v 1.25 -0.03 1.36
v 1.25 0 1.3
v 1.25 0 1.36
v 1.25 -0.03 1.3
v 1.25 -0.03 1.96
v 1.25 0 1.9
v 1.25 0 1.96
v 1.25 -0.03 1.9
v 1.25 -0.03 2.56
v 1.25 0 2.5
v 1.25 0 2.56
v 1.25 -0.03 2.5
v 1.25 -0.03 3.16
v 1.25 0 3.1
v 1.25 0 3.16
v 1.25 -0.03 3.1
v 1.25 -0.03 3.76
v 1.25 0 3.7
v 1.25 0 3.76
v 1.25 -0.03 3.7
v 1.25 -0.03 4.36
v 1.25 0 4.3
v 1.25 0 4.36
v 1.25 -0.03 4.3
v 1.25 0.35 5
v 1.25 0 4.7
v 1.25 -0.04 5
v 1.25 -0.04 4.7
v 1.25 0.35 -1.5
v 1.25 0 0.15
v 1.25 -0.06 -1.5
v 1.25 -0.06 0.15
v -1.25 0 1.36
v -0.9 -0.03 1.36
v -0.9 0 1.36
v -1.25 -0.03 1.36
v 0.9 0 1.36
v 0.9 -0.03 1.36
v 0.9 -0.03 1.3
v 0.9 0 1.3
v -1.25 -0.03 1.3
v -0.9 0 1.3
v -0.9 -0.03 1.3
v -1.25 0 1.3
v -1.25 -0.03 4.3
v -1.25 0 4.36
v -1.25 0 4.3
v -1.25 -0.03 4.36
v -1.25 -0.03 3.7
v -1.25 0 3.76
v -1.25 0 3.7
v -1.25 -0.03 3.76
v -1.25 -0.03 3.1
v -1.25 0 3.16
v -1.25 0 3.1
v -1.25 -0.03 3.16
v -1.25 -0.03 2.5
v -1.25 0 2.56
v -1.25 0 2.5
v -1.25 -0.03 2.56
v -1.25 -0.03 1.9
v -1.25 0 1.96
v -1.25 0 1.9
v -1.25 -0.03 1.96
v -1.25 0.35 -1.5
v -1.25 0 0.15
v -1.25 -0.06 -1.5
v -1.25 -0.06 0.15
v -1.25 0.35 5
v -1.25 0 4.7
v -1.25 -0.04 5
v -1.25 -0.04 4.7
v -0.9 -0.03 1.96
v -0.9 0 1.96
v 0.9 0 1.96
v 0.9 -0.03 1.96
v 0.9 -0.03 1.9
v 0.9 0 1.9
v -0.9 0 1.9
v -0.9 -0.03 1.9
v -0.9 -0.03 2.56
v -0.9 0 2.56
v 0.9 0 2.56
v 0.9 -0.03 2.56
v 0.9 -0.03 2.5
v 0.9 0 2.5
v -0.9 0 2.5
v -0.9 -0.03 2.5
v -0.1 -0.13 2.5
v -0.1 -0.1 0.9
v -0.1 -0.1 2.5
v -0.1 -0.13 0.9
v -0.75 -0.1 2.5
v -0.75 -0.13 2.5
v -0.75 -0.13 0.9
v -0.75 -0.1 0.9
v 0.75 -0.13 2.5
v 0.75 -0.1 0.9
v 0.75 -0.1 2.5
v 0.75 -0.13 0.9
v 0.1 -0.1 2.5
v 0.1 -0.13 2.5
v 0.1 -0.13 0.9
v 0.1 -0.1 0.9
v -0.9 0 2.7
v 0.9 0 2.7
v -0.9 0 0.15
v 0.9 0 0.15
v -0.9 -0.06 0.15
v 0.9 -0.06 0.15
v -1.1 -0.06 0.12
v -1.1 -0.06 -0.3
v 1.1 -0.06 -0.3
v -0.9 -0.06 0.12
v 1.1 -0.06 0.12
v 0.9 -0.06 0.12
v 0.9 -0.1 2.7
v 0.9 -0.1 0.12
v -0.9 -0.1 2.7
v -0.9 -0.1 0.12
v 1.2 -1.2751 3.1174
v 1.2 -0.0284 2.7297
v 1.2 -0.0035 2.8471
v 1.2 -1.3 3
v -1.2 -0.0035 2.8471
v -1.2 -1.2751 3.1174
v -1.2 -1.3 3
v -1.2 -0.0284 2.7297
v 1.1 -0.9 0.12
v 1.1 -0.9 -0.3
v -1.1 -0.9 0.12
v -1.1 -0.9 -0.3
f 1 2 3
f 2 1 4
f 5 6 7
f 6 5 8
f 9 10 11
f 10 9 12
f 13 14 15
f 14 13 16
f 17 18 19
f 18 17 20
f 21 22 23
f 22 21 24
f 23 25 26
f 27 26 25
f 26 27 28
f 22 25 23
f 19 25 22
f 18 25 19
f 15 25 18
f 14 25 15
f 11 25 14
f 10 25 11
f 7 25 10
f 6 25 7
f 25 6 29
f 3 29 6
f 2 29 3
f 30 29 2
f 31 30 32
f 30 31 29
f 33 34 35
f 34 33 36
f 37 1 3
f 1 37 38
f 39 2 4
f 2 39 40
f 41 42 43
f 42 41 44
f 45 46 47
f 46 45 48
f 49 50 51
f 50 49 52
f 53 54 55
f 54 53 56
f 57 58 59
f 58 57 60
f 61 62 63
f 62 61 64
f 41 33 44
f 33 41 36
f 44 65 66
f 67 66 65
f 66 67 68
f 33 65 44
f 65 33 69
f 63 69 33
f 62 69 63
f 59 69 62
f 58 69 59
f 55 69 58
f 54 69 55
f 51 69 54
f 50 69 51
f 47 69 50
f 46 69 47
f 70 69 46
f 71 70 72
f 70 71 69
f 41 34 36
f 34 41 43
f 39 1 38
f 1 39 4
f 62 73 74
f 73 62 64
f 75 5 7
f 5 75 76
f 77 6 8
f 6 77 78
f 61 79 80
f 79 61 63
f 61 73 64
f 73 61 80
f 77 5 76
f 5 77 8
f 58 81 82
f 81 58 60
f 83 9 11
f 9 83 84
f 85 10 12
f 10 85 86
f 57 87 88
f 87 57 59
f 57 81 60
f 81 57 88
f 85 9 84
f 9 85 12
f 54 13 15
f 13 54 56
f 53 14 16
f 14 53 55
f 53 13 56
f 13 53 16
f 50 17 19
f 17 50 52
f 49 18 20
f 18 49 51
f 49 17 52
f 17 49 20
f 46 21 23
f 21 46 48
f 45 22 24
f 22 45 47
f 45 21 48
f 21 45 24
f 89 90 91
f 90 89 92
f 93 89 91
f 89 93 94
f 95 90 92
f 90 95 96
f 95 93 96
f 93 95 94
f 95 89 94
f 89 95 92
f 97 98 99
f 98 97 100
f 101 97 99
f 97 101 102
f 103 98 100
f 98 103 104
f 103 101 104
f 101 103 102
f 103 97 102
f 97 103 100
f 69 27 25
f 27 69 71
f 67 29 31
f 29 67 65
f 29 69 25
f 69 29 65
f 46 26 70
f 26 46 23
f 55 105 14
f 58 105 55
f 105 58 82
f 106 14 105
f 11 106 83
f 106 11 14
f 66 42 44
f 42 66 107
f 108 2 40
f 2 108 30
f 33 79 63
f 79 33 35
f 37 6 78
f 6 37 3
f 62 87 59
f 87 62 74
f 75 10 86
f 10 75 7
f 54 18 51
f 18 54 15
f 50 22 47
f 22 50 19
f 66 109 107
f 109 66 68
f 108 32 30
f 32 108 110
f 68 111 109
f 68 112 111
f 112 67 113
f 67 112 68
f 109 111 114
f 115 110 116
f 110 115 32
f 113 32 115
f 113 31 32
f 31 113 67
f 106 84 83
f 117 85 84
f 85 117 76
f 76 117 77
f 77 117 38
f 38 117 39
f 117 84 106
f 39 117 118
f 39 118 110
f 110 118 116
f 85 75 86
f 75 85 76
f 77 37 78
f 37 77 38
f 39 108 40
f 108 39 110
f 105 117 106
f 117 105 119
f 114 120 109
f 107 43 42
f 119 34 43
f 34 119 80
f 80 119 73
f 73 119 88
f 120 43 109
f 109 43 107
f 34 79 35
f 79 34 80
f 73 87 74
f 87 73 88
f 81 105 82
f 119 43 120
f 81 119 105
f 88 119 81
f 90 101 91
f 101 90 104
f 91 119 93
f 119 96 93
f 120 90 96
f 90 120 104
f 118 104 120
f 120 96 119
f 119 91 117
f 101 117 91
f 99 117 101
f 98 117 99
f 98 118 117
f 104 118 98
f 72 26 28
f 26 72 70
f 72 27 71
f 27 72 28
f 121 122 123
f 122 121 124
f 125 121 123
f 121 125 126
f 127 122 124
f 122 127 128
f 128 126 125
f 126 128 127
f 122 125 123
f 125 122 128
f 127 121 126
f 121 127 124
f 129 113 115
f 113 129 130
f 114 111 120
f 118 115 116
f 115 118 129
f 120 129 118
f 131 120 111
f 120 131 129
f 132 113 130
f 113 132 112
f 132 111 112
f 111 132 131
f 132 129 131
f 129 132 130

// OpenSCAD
// file: lib/lodge_kit.scad
// Lodge shell tile kit — shared dimensions and modules.
//
// The game paints a lodge footprint in 5 m cells and resolves the
// exterior from these tiles at half-cell (2.5 m) resolution; see
// internal/world/lodge_shell.go. Every tile is authored in the same
// canonical frame:
//
//   * origin on the lodge floor plane (Z = 0);
//   * wall-type tiles sit on a footprint edge, centred on it, with the
//     OUTSIDE toward SCAD −Y (game +Z) and the wall thickness toward +Y;
//   * roof tiles are centred on a half-cell, with Z = 0 at the tile's
//     lowest corner; slopes fall toward −Y (game +Z);
//   * corner tiles sit on a grid vertex; an outer corner's building is
//     in the SCAD (−X, +Y) quadrant, an inner corner's notch in (+X, −Y).
//
// Colours are near-neutral: the renderer tints walls and roofs per lodge
// from a seeded palette (world.ShellPalette).
//
// Keep these in sync with the constants in lodge_shell.go.

tile   = 2.5;   // ShellTileSize
wall_h = 5.0;   // ShellWallHeight
rise   = 2.1;   // ShellRoofRise, per tile of run
pitch  = rise / tile;

wall_t   = 0.35;  // wall thickness
sink     = 1.5;   // walls run this far below the floor to hide pad grading
roof_t   = 0.25;  // roof slab thickness
overhang = 0.7;   // eaves overhang past the wall plane

c_wall   = [0.92, 0.90, 0.86];
c_stone  = [0.62, 0.61, 0.60];
c_trim   = [0.97, 0.97, 0.95];
c_glass  = [0.30, 0.42, 0.52];
c_door   = [0.36, 0.25, 0.18];
c_roof   = [0.97, 0.97, 0.97];
c_fascia = [0.55, 0.52, 0.50];

// Plain wall panel: timber above a stone plinth, a trim band under the
// eaves.
module wall_panel() {
    color(c_wall)
        translate([-tile/2, 0, -sink]) cube([tile, wall_t, wall_h + sink]);
    color(c_stone)
        translate([-tile/2, -0.06, -sink]) cube([tile, wall_t, sink + 0.7]);
    color(c_trim)
        translate([-tile/2, -0.04, wall_h - 0.3]) cube([tile, 0.1, 0.3]);
    battens();
}

// Horizontal board lines above the plinth.
module battens() {
    color(c_wall * 0.8)
        for (z = [1.3 : 0.6 : wall_h - 0.6])
            translate([-tile/2, -0.03, z]) cube([tile, 0.04, 0.06]);
}

// A framed pane on the outer face. x0/w along the wall, z0/h up it.
module pane(x0, w, z0, h) {
    color(c_trim)
        translate([x0 - 0.1, -0.05, z0 - 0.1]) cube([w + 0.2, 0.06, h + 0.2]);
    color(c_glass)
        translate([x0, -0.08, z0]) cube([w, 0.06, h]);
}

module wall_window() {
    wall_panel();
    pane(-0.7, 1.4, 1.4, 2.2);
    color(c_trim) translate([-0.02, -0.1, 1.4]) cube([0.04, 0.04, 2.2]); // mullion
}

// Tall window flanked by shutters.
module wall_window_alt() {
    wall_panel();
    pane(-0.5, 1.0, 1.2, 2.8);
    color(c_door) {
        translate([-1.0, -0.1, 1.2]) cube([0.4, 0.05, 2.8]);
        translate([ 0.6, -0.1, 1.2]) cube([0.4, 0.05, 2.8]);
    }
}

// Floor-to-eave glazing for food courts: a low stone sill, then glass in
// three lights.
module wall_glazed() {
    color(c_wall)
        translate([-tile/2, 0, -sink]) cube([tile, wall_t, wall_h + sink]);
    color(c_stone)
        translate([-tile/2, -0.06, -sink]) cube([tile, wall_t, sink + 0.35]);
    color(c_glass)
        translate([-tile/2, -0.09, 0.35]) cube([tile, 0.06, wall_h - 0.75]);
    color(c_trim) {
        for (x = [-tile/2, -tile/6, tile/6, tile/2 - 0.08])
            translate([x, -0.12, 0.35]) cube([0.08, 0.06, wall_h - 0.75]);
        translate([-tile/2, -0.12, wall_h - 0.45]) cube([tile, 0.07, 0.1]);
    }
}

// Glazed entry door under a small canopy, with a step.
module door() {
    color(c_wall)
        translate([-tile/2, 0, -sink]) cube([tile, wall_t, wall_h + sink]);
    color(c_stone)
        translate([-tile/2, -0.06, -sink]) cube([tile, wall_t, sink + 0.15]);
    battens();
    color(c_door)
        translate([-0.9, -0.1, 0]) cube([1.8, 0.1, 2.7]);
    color(c_glass) {
        translate([-0.75, -0.13, 0.9]) cube([0.65, 0.05, 1.6]);
        translate([ 0.10, -0.13, 0.9]) cube([0.65, 0.05, 1.6]);
    }
    color(c_trim)
        translate([-tile/2, -0.04, wall_h - 0.3]) cube([tile, 0.1, 0.3]);
    color(c_roof)   // canopy
        translate([-1.2, -1.3, 3.0])
            rotate([-12, 0, 0]) cube([2.4, 1.3, 0.12]);
    color(c_stone)  // step
        translate([-1.1, -0.9, -0.3]) cube([2.2, 0.9, 0.42]);
}

module corner_outer() {
    color(c_stone)
        translate([-0.3, -0.05, -sink]) cube([0.35, 0.35, wall_h + sink - 0.3]);
}

module corner_inner() {
    color(c_trim)
        translate([0, -0.12, 0]) cube([0.12, 0.12, wall_h - 0.3]);
}

// Roof slab over one half-cell. h lists corner heights (in rise units)
// in SCAD order (−X,+Y), (+X,+Y), (+X,−Y), (−X,−Y); split names which
// diagonal the top surface folds along: 0 through corners 0–2, 1
// through corners 1–3.
module roof_tile(h, split) {
    p = [[-tile/2, tile/2], [tile/2, tile/2], [tile/2, -tile/2], [-tile/2, -tile/2]];
    top = [for (i = [0:3]) [p[i][0], p[i][1], h[i] * rise]];
    bot = [for (i = [0:3]) [p[i][0], p[i][1], h[i] * rise - roof_t]];
    tris = split == 0 ? [[0, 1, 2], [0, 2, 3]] : [[0, 1, 3], [1, 2, 3]];
    color(c_roof)
        polyhedron(
            points = concat(top, bot),
            faces = concat(
                // top (clockwise seen from above = outward in OpenSCAD)
                [for (t = tris) [t[0], t[1], t[2]]],
                [for (t = tris) [t[2] + 4, t[1] + 4, t[0] + 4]],
                [for (i = [0:3]) [i, i + 4, (i + 1) % 4 + 4, (i + 1) % 4]]
            ));
}

// Eaves strip past a wall edge: continues the roof plane outward and
// down, finished with a fascia board.
module eave() {
    drop = overhang * pitch;
    color(c_roof)
        polyhedron(
            points = [
                [-tile/2, 0, 0], [tile/2, 0, 0], [tile/2, -overhang, -drop], [-tile/2, -overhang, -drop],
                [-tile/2, 0, -roof_t], [tile/2, 0, -roof_t], [tile/2, -overhang, -drop - roof_t], [-tile/2, -overhang, -drop - roof_t],
            ],
            faces = [[0, 1, 2, 3], [7, 6, 5, 4], [0, 4, 5, 1], [1, 5, 6, 2], [2, 6, 7, 3], [3, 7, 4, 0]]);
    color(c_fascia)
        translate([-tile/2, -overhang - 0.05, -drop - roof_t - 0.1]) cube([tile, 0.08, roof_t + 0.2]);
}

// Eaves in the square past an outer corner: a hip folding along the
// diagonal away from the building.
module eave_corner() {
    o = overhang;
    d = o * pitch;
    color(c_roof)
        polyhedron(
            points = [
                [0, 0, 0], [o, 0, -d], [o, -o, -d], [0, -o, -d],
                [0, 0, -roof_t], [o, 0, -d - roof_t], [o, -o, -d - roof_t], [0, -o, -d - roof_t],
            ],
            faces = [[0, 1, 2], [0, 2, 3], [6, 5, 4], [7, 6, 4], [0, 4, 5, 1], [1, 5, 6, 2], [2, 6, 7, 3], [3, 7, 4, 0]]);
    color(c_fascia) {
        translate([0, -o - 0.05, -d - roof_t - 0.1]) cube([o + 0.05, 0.08, roof_t + 0.2]);
        translate([o - 0.03, -o - 0.05, -d - roof_t - 0.1]) cube([0.08, o + 0.05, roof_t + 0.2]);
    }
}

module chimney() {
    color(c_stone)
        translate([-0.55, -0.55, -1.0]) cube([1.1, 1.1, rise + 3.0]);
    color(c_fascia)
        translate([-0.65, -0.65, rise + 1.8]) cube([1.3, 1.3, 0.2]);
}
// main file
// Lodge shell kit: entry door. See lib/lodge_kit.scad.
include <lib/lodge_kit.scad>
door();
